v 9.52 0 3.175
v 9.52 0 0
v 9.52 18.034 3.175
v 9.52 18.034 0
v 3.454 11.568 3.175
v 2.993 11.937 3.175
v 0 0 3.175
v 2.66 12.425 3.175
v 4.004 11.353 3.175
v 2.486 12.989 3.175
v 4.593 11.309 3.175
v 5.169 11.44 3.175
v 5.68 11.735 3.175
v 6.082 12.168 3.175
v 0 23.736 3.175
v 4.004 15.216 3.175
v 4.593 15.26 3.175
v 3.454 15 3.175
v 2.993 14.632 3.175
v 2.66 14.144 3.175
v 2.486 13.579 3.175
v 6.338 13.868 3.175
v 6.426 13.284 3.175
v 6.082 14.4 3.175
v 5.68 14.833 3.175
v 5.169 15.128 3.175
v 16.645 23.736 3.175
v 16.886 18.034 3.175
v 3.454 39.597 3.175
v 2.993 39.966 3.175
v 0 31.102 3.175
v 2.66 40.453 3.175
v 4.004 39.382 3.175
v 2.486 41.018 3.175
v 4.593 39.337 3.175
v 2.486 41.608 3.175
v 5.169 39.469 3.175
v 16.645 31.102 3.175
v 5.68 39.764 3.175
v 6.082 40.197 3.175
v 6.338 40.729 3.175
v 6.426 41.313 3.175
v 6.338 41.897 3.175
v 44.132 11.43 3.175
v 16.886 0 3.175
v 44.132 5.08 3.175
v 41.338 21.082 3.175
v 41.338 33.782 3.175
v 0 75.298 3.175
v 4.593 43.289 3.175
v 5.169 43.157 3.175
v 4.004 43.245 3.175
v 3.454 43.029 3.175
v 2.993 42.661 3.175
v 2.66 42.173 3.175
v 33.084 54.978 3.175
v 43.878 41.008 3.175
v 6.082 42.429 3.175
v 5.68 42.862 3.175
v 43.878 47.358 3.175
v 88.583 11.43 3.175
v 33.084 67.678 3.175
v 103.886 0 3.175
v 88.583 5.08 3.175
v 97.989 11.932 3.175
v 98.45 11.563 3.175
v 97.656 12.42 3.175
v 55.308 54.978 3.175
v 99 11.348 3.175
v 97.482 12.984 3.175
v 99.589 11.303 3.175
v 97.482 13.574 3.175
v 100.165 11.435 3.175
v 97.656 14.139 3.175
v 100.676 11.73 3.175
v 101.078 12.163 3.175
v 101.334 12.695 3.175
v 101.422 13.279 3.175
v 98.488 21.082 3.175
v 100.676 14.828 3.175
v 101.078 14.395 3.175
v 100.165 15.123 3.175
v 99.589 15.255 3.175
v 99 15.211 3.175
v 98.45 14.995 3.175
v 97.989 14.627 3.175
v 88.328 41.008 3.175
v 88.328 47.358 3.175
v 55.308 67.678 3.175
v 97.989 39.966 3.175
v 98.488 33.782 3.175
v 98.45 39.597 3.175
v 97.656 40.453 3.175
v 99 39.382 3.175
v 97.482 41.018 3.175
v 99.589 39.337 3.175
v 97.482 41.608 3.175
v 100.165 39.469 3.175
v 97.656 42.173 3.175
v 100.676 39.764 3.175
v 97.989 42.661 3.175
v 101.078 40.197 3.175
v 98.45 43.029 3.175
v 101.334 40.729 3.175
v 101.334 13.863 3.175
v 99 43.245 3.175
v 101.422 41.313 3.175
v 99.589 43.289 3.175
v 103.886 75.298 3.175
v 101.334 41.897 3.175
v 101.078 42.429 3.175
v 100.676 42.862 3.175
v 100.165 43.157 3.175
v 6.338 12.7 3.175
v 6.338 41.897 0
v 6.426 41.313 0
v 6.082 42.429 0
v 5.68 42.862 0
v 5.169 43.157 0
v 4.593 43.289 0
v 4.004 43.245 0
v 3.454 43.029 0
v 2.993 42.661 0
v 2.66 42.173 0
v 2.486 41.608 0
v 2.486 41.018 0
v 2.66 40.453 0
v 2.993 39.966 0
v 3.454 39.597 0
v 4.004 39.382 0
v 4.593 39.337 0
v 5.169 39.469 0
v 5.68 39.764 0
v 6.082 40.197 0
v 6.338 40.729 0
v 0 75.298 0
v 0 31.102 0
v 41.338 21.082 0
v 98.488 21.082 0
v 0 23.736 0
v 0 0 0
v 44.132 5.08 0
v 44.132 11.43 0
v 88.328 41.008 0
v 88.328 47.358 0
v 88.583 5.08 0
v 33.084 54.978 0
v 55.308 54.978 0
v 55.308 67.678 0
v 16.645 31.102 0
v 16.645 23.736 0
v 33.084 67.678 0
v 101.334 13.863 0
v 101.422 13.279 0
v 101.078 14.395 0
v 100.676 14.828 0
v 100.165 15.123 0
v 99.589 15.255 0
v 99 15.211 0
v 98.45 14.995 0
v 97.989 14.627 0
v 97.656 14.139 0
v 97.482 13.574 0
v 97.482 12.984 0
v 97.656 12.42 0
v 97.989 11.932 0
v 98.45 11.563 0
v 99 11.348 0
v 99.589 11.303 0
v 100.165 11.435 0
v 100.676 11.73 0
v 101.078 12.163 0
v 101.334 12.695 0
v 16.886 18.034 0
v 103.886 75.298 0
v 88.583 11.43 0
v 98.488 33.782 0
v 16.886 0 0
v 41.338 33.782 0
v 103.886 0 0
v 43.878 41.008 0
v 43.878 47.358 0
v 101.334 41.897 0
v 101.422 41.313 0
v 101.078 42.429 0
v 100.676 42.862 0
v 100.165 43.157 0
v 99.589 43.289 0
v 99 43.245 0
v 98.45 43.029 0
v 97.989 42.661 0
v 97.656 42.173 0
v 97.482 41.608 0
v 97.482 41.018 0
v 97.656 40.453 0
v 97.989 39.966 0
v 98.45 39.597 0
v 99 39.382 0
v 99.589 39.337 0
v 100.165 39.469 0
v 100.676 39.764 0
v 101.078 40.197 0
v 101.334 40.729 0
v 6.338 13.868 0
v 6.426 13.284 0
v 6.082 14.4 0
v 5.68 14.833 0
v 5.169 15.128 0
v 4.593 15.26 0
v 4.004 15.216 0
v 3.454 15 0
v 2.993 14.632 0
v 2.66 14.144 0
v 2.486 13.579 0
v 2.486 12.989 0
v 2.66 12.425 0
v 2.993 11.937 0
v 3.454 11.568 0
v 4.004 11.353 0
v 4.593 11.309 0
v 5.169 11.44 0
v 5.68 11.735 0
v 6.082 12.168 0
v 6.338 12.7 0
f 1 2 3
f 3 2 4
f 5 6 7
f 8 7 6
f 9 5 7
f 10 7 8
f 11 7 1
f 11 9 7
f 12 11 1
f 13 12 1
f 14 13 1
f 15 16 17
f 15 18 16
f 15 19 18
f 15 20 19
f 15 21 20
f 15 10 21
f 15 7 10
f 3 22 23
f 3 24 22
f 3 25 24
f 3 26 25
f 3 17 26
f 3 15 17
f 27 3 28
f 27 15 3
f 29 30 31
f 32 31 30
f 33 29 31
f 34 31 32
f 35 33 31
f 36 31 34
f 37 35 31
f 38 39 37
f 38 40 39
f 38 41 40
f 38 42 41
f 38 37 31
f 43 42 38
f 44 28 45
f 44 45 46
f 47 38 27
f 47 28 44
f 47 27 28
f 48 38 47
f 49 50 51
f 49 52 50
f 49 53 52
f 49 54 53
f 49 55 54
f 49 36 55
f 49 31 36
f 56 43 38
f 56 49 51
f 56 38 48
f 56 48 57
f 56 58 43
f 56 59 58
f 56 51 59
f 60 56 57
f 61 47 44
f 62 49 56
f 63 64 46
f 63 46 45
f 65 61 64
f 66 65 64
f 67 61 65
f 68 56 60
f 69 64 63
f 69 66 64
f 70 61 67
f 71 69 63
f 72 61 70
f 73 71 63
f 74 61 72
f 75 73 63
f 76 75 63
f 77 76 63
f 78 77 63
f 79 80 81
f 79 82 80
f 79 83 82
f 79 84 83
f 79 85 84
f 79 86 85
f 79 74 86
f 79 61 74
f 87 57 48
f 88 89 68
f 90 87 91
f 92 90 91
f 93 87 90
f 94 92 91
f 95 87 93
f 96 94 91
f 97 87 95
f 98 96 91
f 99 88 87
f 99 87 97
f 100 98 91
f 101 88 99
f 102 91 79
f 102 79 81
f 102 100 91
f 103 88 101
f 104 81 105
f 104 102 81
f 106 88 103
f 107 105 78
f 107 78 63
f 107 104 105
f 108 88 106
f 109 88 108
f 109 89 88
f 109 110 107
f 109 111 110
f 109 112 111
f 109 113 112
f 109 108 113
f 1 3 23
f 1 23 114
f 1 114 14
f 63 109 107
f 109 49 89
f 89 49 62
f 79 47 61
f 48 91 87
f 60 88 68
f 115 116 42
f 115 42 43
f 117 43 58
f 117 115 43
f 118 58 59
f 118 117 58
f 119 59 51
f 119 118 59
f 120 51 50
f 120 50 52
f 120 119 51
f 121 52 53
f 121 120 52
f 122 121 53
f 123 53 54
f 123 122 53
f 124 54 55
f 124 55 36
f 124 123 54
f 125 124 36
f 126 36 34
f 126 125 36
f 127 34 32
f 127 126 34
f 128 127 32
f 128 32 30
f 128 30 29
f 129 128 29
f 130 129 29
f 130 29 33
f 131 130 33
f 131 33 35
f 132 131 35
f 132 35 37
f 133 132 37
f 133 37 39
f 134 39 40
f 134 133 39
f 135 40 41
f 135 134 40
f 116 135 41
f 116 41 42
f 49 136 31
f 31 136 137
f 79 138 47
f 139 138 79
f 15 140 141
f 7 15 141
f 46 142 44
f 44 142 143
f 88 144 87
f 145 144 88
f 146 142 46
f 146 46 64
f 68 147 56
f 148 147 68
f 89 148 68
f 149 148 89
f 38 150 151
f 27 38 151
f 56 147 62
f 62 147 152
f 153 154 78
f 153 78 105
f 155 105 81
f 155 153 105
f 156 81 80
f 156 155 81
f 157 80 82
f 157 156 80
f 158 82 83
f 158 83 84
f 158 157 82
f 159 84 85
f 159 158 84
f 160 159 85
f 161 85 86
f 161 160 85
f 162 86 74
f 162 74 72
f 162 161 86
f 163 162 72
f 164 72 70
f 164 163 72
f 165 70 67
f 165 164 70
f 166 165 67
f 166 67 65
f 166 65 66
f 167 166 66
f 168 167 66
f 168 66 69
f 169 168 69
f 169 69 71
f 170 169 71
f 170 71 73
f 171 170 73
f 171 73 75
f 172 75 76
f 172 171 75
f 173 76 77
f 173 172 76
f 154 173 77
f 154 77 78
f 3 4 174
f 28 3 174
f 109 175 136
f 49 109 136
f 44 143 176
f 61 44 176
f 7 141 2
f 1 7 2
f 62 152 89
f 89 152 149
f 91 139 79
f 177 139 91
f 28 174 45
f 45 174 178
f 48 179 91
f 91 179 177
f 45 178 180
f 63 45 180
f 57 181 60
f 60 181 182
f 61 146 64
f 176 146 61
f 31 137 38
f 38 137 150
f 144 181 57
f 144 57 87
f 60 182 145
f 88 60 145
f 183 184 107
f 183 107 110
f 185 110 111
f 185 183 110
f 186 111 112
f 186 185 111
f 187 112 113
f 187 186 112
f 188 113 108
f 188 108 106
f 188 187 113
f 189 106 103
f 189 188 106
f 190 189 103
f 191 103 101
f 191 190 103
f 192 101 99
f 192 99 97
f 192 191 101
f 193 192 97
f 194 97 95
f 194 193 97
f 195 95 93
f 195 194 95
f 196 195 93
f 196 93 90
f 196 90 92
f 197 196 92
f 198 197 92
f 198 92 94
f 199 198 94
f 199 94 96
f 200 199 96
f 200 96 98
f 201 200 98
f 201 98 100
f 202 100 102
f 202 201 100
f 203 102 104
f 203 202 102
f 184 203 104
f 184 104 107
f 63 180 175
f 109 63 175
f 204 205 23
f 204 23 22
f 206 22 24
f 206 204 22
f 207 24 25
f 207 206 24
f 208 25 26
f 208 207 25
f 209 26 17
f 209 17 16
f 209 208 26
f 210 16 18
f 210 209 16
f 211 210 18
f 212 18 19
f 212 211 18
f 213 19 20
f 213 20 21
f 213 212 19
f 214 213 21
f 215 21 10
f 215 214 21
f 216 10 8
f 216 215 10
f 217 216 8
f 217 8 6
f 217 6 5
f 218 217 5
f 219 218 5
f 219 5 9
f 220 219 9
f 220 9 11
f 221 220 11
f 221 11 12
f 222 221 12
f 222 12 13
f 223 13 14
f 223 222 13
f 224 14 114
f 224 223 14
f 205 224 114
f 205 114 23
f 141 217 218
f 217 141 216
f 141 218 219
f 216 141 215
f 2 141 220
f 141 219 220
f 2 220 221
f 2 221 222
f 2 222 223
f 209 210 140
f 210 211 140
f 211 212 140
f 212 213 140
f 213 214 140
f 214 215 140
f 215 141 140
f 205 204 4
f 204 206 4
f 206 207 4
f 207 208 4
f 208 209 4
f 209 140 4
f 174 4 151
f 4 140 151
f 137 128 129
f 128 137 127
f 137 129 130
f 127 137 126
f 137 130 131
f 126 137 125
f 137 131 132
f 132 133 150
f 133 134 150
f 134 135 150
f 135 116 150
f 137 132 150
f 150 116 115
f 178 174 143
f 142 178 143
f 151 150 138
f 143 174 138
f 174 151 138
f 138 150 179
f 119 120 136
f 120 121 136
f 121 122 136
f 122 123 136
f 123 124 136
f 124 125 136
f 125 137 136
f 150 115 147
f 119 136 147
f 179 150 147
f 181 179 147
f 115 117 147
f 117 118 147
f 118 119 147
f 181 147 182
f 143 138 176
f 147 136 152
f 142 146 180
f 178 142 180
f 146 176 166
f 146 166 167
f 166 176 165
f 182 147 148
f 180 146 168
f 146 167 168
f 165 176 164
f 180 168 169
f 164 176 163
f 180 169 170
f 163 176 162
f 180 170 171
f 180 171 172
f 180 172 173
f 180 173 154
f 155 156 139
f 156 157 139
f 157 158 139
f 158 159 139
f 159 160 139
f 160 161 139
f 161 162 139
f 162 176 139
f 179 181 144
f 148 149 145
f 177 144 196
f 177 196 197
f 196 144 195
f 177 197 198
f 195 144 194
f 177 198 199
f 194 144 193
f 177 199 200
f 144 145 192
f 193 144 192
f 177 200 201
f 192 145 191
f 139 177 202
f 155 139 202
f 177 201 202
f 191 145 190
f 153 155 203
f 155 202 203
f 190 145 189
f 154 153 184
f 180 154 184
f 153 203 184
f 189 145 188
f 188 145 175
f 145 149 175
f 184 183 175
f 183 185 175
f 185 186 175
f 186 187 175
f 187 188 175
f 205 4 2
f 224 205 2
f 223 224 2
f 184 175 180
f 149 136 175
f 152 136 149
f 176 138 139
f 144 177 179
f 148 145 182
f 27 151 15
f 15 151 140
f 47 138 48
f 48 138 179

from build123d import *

# Parameters (mm, degrees)
F0_R     = 1.9812
F0_W     = 44.45
F0_H     = 6.35
F0_W_2   = 57.15
F0_H_2   = 12.7
F0_W_3   = 22.225
F1_DEPTH = 3.175


with BuildPart() as f1:
    # F0 (on Top) → F1 (new body)
    with BuildSketch(Plane.XY):
        Polygon((0, 23.7363), (0, 0), (9.51992, 0), (9.51992, 18.034), (16.88592, 18.034), (16.88592, 0), (103.886, 0), (103.886, 75.2983), (0, 75.2983), (0, 31.1023), (16.64462, 31.1023), (16.64462, 23.7363), align=None)
        with Locations((4.445, 13.2842)):
            Circle(F0_R, mode=Mode.SUBTRACT)
        with Locations((66.3575, 8.255)):
            Rectangle(F0_W, F0_H, mode=Mode.SUBTRACT)
        with Locations((99.441, 13.27912)):
            Circle(F0_R, mode=Mode.SUBTRACT)
        with Locations((69.9135, 27.432)):
            Rectangle(F0_W_2, F0_H_2, mode=Mode.SUBTRACT)
        with Locations((4.445, 41.3131)):
            Circle(F0_R, mode=Mode.SUBTRACT)
        with Locations((44.196, 61.3283)):
            Rectangle(F0_W_3, F0_H_2, mode=Mode.SUBTRACT)
        with Locations((66.1035, 44.1833)):
            Rectangle(F0_W, F0_H, mode=Mode.SUBTRACT)
        with Locations((99.441, 41.3131)):
            Circle(F0_R, mode=Mode.SUBTRACT)
    extrude(amount=F1_DEPTH)


solid = f1.part
